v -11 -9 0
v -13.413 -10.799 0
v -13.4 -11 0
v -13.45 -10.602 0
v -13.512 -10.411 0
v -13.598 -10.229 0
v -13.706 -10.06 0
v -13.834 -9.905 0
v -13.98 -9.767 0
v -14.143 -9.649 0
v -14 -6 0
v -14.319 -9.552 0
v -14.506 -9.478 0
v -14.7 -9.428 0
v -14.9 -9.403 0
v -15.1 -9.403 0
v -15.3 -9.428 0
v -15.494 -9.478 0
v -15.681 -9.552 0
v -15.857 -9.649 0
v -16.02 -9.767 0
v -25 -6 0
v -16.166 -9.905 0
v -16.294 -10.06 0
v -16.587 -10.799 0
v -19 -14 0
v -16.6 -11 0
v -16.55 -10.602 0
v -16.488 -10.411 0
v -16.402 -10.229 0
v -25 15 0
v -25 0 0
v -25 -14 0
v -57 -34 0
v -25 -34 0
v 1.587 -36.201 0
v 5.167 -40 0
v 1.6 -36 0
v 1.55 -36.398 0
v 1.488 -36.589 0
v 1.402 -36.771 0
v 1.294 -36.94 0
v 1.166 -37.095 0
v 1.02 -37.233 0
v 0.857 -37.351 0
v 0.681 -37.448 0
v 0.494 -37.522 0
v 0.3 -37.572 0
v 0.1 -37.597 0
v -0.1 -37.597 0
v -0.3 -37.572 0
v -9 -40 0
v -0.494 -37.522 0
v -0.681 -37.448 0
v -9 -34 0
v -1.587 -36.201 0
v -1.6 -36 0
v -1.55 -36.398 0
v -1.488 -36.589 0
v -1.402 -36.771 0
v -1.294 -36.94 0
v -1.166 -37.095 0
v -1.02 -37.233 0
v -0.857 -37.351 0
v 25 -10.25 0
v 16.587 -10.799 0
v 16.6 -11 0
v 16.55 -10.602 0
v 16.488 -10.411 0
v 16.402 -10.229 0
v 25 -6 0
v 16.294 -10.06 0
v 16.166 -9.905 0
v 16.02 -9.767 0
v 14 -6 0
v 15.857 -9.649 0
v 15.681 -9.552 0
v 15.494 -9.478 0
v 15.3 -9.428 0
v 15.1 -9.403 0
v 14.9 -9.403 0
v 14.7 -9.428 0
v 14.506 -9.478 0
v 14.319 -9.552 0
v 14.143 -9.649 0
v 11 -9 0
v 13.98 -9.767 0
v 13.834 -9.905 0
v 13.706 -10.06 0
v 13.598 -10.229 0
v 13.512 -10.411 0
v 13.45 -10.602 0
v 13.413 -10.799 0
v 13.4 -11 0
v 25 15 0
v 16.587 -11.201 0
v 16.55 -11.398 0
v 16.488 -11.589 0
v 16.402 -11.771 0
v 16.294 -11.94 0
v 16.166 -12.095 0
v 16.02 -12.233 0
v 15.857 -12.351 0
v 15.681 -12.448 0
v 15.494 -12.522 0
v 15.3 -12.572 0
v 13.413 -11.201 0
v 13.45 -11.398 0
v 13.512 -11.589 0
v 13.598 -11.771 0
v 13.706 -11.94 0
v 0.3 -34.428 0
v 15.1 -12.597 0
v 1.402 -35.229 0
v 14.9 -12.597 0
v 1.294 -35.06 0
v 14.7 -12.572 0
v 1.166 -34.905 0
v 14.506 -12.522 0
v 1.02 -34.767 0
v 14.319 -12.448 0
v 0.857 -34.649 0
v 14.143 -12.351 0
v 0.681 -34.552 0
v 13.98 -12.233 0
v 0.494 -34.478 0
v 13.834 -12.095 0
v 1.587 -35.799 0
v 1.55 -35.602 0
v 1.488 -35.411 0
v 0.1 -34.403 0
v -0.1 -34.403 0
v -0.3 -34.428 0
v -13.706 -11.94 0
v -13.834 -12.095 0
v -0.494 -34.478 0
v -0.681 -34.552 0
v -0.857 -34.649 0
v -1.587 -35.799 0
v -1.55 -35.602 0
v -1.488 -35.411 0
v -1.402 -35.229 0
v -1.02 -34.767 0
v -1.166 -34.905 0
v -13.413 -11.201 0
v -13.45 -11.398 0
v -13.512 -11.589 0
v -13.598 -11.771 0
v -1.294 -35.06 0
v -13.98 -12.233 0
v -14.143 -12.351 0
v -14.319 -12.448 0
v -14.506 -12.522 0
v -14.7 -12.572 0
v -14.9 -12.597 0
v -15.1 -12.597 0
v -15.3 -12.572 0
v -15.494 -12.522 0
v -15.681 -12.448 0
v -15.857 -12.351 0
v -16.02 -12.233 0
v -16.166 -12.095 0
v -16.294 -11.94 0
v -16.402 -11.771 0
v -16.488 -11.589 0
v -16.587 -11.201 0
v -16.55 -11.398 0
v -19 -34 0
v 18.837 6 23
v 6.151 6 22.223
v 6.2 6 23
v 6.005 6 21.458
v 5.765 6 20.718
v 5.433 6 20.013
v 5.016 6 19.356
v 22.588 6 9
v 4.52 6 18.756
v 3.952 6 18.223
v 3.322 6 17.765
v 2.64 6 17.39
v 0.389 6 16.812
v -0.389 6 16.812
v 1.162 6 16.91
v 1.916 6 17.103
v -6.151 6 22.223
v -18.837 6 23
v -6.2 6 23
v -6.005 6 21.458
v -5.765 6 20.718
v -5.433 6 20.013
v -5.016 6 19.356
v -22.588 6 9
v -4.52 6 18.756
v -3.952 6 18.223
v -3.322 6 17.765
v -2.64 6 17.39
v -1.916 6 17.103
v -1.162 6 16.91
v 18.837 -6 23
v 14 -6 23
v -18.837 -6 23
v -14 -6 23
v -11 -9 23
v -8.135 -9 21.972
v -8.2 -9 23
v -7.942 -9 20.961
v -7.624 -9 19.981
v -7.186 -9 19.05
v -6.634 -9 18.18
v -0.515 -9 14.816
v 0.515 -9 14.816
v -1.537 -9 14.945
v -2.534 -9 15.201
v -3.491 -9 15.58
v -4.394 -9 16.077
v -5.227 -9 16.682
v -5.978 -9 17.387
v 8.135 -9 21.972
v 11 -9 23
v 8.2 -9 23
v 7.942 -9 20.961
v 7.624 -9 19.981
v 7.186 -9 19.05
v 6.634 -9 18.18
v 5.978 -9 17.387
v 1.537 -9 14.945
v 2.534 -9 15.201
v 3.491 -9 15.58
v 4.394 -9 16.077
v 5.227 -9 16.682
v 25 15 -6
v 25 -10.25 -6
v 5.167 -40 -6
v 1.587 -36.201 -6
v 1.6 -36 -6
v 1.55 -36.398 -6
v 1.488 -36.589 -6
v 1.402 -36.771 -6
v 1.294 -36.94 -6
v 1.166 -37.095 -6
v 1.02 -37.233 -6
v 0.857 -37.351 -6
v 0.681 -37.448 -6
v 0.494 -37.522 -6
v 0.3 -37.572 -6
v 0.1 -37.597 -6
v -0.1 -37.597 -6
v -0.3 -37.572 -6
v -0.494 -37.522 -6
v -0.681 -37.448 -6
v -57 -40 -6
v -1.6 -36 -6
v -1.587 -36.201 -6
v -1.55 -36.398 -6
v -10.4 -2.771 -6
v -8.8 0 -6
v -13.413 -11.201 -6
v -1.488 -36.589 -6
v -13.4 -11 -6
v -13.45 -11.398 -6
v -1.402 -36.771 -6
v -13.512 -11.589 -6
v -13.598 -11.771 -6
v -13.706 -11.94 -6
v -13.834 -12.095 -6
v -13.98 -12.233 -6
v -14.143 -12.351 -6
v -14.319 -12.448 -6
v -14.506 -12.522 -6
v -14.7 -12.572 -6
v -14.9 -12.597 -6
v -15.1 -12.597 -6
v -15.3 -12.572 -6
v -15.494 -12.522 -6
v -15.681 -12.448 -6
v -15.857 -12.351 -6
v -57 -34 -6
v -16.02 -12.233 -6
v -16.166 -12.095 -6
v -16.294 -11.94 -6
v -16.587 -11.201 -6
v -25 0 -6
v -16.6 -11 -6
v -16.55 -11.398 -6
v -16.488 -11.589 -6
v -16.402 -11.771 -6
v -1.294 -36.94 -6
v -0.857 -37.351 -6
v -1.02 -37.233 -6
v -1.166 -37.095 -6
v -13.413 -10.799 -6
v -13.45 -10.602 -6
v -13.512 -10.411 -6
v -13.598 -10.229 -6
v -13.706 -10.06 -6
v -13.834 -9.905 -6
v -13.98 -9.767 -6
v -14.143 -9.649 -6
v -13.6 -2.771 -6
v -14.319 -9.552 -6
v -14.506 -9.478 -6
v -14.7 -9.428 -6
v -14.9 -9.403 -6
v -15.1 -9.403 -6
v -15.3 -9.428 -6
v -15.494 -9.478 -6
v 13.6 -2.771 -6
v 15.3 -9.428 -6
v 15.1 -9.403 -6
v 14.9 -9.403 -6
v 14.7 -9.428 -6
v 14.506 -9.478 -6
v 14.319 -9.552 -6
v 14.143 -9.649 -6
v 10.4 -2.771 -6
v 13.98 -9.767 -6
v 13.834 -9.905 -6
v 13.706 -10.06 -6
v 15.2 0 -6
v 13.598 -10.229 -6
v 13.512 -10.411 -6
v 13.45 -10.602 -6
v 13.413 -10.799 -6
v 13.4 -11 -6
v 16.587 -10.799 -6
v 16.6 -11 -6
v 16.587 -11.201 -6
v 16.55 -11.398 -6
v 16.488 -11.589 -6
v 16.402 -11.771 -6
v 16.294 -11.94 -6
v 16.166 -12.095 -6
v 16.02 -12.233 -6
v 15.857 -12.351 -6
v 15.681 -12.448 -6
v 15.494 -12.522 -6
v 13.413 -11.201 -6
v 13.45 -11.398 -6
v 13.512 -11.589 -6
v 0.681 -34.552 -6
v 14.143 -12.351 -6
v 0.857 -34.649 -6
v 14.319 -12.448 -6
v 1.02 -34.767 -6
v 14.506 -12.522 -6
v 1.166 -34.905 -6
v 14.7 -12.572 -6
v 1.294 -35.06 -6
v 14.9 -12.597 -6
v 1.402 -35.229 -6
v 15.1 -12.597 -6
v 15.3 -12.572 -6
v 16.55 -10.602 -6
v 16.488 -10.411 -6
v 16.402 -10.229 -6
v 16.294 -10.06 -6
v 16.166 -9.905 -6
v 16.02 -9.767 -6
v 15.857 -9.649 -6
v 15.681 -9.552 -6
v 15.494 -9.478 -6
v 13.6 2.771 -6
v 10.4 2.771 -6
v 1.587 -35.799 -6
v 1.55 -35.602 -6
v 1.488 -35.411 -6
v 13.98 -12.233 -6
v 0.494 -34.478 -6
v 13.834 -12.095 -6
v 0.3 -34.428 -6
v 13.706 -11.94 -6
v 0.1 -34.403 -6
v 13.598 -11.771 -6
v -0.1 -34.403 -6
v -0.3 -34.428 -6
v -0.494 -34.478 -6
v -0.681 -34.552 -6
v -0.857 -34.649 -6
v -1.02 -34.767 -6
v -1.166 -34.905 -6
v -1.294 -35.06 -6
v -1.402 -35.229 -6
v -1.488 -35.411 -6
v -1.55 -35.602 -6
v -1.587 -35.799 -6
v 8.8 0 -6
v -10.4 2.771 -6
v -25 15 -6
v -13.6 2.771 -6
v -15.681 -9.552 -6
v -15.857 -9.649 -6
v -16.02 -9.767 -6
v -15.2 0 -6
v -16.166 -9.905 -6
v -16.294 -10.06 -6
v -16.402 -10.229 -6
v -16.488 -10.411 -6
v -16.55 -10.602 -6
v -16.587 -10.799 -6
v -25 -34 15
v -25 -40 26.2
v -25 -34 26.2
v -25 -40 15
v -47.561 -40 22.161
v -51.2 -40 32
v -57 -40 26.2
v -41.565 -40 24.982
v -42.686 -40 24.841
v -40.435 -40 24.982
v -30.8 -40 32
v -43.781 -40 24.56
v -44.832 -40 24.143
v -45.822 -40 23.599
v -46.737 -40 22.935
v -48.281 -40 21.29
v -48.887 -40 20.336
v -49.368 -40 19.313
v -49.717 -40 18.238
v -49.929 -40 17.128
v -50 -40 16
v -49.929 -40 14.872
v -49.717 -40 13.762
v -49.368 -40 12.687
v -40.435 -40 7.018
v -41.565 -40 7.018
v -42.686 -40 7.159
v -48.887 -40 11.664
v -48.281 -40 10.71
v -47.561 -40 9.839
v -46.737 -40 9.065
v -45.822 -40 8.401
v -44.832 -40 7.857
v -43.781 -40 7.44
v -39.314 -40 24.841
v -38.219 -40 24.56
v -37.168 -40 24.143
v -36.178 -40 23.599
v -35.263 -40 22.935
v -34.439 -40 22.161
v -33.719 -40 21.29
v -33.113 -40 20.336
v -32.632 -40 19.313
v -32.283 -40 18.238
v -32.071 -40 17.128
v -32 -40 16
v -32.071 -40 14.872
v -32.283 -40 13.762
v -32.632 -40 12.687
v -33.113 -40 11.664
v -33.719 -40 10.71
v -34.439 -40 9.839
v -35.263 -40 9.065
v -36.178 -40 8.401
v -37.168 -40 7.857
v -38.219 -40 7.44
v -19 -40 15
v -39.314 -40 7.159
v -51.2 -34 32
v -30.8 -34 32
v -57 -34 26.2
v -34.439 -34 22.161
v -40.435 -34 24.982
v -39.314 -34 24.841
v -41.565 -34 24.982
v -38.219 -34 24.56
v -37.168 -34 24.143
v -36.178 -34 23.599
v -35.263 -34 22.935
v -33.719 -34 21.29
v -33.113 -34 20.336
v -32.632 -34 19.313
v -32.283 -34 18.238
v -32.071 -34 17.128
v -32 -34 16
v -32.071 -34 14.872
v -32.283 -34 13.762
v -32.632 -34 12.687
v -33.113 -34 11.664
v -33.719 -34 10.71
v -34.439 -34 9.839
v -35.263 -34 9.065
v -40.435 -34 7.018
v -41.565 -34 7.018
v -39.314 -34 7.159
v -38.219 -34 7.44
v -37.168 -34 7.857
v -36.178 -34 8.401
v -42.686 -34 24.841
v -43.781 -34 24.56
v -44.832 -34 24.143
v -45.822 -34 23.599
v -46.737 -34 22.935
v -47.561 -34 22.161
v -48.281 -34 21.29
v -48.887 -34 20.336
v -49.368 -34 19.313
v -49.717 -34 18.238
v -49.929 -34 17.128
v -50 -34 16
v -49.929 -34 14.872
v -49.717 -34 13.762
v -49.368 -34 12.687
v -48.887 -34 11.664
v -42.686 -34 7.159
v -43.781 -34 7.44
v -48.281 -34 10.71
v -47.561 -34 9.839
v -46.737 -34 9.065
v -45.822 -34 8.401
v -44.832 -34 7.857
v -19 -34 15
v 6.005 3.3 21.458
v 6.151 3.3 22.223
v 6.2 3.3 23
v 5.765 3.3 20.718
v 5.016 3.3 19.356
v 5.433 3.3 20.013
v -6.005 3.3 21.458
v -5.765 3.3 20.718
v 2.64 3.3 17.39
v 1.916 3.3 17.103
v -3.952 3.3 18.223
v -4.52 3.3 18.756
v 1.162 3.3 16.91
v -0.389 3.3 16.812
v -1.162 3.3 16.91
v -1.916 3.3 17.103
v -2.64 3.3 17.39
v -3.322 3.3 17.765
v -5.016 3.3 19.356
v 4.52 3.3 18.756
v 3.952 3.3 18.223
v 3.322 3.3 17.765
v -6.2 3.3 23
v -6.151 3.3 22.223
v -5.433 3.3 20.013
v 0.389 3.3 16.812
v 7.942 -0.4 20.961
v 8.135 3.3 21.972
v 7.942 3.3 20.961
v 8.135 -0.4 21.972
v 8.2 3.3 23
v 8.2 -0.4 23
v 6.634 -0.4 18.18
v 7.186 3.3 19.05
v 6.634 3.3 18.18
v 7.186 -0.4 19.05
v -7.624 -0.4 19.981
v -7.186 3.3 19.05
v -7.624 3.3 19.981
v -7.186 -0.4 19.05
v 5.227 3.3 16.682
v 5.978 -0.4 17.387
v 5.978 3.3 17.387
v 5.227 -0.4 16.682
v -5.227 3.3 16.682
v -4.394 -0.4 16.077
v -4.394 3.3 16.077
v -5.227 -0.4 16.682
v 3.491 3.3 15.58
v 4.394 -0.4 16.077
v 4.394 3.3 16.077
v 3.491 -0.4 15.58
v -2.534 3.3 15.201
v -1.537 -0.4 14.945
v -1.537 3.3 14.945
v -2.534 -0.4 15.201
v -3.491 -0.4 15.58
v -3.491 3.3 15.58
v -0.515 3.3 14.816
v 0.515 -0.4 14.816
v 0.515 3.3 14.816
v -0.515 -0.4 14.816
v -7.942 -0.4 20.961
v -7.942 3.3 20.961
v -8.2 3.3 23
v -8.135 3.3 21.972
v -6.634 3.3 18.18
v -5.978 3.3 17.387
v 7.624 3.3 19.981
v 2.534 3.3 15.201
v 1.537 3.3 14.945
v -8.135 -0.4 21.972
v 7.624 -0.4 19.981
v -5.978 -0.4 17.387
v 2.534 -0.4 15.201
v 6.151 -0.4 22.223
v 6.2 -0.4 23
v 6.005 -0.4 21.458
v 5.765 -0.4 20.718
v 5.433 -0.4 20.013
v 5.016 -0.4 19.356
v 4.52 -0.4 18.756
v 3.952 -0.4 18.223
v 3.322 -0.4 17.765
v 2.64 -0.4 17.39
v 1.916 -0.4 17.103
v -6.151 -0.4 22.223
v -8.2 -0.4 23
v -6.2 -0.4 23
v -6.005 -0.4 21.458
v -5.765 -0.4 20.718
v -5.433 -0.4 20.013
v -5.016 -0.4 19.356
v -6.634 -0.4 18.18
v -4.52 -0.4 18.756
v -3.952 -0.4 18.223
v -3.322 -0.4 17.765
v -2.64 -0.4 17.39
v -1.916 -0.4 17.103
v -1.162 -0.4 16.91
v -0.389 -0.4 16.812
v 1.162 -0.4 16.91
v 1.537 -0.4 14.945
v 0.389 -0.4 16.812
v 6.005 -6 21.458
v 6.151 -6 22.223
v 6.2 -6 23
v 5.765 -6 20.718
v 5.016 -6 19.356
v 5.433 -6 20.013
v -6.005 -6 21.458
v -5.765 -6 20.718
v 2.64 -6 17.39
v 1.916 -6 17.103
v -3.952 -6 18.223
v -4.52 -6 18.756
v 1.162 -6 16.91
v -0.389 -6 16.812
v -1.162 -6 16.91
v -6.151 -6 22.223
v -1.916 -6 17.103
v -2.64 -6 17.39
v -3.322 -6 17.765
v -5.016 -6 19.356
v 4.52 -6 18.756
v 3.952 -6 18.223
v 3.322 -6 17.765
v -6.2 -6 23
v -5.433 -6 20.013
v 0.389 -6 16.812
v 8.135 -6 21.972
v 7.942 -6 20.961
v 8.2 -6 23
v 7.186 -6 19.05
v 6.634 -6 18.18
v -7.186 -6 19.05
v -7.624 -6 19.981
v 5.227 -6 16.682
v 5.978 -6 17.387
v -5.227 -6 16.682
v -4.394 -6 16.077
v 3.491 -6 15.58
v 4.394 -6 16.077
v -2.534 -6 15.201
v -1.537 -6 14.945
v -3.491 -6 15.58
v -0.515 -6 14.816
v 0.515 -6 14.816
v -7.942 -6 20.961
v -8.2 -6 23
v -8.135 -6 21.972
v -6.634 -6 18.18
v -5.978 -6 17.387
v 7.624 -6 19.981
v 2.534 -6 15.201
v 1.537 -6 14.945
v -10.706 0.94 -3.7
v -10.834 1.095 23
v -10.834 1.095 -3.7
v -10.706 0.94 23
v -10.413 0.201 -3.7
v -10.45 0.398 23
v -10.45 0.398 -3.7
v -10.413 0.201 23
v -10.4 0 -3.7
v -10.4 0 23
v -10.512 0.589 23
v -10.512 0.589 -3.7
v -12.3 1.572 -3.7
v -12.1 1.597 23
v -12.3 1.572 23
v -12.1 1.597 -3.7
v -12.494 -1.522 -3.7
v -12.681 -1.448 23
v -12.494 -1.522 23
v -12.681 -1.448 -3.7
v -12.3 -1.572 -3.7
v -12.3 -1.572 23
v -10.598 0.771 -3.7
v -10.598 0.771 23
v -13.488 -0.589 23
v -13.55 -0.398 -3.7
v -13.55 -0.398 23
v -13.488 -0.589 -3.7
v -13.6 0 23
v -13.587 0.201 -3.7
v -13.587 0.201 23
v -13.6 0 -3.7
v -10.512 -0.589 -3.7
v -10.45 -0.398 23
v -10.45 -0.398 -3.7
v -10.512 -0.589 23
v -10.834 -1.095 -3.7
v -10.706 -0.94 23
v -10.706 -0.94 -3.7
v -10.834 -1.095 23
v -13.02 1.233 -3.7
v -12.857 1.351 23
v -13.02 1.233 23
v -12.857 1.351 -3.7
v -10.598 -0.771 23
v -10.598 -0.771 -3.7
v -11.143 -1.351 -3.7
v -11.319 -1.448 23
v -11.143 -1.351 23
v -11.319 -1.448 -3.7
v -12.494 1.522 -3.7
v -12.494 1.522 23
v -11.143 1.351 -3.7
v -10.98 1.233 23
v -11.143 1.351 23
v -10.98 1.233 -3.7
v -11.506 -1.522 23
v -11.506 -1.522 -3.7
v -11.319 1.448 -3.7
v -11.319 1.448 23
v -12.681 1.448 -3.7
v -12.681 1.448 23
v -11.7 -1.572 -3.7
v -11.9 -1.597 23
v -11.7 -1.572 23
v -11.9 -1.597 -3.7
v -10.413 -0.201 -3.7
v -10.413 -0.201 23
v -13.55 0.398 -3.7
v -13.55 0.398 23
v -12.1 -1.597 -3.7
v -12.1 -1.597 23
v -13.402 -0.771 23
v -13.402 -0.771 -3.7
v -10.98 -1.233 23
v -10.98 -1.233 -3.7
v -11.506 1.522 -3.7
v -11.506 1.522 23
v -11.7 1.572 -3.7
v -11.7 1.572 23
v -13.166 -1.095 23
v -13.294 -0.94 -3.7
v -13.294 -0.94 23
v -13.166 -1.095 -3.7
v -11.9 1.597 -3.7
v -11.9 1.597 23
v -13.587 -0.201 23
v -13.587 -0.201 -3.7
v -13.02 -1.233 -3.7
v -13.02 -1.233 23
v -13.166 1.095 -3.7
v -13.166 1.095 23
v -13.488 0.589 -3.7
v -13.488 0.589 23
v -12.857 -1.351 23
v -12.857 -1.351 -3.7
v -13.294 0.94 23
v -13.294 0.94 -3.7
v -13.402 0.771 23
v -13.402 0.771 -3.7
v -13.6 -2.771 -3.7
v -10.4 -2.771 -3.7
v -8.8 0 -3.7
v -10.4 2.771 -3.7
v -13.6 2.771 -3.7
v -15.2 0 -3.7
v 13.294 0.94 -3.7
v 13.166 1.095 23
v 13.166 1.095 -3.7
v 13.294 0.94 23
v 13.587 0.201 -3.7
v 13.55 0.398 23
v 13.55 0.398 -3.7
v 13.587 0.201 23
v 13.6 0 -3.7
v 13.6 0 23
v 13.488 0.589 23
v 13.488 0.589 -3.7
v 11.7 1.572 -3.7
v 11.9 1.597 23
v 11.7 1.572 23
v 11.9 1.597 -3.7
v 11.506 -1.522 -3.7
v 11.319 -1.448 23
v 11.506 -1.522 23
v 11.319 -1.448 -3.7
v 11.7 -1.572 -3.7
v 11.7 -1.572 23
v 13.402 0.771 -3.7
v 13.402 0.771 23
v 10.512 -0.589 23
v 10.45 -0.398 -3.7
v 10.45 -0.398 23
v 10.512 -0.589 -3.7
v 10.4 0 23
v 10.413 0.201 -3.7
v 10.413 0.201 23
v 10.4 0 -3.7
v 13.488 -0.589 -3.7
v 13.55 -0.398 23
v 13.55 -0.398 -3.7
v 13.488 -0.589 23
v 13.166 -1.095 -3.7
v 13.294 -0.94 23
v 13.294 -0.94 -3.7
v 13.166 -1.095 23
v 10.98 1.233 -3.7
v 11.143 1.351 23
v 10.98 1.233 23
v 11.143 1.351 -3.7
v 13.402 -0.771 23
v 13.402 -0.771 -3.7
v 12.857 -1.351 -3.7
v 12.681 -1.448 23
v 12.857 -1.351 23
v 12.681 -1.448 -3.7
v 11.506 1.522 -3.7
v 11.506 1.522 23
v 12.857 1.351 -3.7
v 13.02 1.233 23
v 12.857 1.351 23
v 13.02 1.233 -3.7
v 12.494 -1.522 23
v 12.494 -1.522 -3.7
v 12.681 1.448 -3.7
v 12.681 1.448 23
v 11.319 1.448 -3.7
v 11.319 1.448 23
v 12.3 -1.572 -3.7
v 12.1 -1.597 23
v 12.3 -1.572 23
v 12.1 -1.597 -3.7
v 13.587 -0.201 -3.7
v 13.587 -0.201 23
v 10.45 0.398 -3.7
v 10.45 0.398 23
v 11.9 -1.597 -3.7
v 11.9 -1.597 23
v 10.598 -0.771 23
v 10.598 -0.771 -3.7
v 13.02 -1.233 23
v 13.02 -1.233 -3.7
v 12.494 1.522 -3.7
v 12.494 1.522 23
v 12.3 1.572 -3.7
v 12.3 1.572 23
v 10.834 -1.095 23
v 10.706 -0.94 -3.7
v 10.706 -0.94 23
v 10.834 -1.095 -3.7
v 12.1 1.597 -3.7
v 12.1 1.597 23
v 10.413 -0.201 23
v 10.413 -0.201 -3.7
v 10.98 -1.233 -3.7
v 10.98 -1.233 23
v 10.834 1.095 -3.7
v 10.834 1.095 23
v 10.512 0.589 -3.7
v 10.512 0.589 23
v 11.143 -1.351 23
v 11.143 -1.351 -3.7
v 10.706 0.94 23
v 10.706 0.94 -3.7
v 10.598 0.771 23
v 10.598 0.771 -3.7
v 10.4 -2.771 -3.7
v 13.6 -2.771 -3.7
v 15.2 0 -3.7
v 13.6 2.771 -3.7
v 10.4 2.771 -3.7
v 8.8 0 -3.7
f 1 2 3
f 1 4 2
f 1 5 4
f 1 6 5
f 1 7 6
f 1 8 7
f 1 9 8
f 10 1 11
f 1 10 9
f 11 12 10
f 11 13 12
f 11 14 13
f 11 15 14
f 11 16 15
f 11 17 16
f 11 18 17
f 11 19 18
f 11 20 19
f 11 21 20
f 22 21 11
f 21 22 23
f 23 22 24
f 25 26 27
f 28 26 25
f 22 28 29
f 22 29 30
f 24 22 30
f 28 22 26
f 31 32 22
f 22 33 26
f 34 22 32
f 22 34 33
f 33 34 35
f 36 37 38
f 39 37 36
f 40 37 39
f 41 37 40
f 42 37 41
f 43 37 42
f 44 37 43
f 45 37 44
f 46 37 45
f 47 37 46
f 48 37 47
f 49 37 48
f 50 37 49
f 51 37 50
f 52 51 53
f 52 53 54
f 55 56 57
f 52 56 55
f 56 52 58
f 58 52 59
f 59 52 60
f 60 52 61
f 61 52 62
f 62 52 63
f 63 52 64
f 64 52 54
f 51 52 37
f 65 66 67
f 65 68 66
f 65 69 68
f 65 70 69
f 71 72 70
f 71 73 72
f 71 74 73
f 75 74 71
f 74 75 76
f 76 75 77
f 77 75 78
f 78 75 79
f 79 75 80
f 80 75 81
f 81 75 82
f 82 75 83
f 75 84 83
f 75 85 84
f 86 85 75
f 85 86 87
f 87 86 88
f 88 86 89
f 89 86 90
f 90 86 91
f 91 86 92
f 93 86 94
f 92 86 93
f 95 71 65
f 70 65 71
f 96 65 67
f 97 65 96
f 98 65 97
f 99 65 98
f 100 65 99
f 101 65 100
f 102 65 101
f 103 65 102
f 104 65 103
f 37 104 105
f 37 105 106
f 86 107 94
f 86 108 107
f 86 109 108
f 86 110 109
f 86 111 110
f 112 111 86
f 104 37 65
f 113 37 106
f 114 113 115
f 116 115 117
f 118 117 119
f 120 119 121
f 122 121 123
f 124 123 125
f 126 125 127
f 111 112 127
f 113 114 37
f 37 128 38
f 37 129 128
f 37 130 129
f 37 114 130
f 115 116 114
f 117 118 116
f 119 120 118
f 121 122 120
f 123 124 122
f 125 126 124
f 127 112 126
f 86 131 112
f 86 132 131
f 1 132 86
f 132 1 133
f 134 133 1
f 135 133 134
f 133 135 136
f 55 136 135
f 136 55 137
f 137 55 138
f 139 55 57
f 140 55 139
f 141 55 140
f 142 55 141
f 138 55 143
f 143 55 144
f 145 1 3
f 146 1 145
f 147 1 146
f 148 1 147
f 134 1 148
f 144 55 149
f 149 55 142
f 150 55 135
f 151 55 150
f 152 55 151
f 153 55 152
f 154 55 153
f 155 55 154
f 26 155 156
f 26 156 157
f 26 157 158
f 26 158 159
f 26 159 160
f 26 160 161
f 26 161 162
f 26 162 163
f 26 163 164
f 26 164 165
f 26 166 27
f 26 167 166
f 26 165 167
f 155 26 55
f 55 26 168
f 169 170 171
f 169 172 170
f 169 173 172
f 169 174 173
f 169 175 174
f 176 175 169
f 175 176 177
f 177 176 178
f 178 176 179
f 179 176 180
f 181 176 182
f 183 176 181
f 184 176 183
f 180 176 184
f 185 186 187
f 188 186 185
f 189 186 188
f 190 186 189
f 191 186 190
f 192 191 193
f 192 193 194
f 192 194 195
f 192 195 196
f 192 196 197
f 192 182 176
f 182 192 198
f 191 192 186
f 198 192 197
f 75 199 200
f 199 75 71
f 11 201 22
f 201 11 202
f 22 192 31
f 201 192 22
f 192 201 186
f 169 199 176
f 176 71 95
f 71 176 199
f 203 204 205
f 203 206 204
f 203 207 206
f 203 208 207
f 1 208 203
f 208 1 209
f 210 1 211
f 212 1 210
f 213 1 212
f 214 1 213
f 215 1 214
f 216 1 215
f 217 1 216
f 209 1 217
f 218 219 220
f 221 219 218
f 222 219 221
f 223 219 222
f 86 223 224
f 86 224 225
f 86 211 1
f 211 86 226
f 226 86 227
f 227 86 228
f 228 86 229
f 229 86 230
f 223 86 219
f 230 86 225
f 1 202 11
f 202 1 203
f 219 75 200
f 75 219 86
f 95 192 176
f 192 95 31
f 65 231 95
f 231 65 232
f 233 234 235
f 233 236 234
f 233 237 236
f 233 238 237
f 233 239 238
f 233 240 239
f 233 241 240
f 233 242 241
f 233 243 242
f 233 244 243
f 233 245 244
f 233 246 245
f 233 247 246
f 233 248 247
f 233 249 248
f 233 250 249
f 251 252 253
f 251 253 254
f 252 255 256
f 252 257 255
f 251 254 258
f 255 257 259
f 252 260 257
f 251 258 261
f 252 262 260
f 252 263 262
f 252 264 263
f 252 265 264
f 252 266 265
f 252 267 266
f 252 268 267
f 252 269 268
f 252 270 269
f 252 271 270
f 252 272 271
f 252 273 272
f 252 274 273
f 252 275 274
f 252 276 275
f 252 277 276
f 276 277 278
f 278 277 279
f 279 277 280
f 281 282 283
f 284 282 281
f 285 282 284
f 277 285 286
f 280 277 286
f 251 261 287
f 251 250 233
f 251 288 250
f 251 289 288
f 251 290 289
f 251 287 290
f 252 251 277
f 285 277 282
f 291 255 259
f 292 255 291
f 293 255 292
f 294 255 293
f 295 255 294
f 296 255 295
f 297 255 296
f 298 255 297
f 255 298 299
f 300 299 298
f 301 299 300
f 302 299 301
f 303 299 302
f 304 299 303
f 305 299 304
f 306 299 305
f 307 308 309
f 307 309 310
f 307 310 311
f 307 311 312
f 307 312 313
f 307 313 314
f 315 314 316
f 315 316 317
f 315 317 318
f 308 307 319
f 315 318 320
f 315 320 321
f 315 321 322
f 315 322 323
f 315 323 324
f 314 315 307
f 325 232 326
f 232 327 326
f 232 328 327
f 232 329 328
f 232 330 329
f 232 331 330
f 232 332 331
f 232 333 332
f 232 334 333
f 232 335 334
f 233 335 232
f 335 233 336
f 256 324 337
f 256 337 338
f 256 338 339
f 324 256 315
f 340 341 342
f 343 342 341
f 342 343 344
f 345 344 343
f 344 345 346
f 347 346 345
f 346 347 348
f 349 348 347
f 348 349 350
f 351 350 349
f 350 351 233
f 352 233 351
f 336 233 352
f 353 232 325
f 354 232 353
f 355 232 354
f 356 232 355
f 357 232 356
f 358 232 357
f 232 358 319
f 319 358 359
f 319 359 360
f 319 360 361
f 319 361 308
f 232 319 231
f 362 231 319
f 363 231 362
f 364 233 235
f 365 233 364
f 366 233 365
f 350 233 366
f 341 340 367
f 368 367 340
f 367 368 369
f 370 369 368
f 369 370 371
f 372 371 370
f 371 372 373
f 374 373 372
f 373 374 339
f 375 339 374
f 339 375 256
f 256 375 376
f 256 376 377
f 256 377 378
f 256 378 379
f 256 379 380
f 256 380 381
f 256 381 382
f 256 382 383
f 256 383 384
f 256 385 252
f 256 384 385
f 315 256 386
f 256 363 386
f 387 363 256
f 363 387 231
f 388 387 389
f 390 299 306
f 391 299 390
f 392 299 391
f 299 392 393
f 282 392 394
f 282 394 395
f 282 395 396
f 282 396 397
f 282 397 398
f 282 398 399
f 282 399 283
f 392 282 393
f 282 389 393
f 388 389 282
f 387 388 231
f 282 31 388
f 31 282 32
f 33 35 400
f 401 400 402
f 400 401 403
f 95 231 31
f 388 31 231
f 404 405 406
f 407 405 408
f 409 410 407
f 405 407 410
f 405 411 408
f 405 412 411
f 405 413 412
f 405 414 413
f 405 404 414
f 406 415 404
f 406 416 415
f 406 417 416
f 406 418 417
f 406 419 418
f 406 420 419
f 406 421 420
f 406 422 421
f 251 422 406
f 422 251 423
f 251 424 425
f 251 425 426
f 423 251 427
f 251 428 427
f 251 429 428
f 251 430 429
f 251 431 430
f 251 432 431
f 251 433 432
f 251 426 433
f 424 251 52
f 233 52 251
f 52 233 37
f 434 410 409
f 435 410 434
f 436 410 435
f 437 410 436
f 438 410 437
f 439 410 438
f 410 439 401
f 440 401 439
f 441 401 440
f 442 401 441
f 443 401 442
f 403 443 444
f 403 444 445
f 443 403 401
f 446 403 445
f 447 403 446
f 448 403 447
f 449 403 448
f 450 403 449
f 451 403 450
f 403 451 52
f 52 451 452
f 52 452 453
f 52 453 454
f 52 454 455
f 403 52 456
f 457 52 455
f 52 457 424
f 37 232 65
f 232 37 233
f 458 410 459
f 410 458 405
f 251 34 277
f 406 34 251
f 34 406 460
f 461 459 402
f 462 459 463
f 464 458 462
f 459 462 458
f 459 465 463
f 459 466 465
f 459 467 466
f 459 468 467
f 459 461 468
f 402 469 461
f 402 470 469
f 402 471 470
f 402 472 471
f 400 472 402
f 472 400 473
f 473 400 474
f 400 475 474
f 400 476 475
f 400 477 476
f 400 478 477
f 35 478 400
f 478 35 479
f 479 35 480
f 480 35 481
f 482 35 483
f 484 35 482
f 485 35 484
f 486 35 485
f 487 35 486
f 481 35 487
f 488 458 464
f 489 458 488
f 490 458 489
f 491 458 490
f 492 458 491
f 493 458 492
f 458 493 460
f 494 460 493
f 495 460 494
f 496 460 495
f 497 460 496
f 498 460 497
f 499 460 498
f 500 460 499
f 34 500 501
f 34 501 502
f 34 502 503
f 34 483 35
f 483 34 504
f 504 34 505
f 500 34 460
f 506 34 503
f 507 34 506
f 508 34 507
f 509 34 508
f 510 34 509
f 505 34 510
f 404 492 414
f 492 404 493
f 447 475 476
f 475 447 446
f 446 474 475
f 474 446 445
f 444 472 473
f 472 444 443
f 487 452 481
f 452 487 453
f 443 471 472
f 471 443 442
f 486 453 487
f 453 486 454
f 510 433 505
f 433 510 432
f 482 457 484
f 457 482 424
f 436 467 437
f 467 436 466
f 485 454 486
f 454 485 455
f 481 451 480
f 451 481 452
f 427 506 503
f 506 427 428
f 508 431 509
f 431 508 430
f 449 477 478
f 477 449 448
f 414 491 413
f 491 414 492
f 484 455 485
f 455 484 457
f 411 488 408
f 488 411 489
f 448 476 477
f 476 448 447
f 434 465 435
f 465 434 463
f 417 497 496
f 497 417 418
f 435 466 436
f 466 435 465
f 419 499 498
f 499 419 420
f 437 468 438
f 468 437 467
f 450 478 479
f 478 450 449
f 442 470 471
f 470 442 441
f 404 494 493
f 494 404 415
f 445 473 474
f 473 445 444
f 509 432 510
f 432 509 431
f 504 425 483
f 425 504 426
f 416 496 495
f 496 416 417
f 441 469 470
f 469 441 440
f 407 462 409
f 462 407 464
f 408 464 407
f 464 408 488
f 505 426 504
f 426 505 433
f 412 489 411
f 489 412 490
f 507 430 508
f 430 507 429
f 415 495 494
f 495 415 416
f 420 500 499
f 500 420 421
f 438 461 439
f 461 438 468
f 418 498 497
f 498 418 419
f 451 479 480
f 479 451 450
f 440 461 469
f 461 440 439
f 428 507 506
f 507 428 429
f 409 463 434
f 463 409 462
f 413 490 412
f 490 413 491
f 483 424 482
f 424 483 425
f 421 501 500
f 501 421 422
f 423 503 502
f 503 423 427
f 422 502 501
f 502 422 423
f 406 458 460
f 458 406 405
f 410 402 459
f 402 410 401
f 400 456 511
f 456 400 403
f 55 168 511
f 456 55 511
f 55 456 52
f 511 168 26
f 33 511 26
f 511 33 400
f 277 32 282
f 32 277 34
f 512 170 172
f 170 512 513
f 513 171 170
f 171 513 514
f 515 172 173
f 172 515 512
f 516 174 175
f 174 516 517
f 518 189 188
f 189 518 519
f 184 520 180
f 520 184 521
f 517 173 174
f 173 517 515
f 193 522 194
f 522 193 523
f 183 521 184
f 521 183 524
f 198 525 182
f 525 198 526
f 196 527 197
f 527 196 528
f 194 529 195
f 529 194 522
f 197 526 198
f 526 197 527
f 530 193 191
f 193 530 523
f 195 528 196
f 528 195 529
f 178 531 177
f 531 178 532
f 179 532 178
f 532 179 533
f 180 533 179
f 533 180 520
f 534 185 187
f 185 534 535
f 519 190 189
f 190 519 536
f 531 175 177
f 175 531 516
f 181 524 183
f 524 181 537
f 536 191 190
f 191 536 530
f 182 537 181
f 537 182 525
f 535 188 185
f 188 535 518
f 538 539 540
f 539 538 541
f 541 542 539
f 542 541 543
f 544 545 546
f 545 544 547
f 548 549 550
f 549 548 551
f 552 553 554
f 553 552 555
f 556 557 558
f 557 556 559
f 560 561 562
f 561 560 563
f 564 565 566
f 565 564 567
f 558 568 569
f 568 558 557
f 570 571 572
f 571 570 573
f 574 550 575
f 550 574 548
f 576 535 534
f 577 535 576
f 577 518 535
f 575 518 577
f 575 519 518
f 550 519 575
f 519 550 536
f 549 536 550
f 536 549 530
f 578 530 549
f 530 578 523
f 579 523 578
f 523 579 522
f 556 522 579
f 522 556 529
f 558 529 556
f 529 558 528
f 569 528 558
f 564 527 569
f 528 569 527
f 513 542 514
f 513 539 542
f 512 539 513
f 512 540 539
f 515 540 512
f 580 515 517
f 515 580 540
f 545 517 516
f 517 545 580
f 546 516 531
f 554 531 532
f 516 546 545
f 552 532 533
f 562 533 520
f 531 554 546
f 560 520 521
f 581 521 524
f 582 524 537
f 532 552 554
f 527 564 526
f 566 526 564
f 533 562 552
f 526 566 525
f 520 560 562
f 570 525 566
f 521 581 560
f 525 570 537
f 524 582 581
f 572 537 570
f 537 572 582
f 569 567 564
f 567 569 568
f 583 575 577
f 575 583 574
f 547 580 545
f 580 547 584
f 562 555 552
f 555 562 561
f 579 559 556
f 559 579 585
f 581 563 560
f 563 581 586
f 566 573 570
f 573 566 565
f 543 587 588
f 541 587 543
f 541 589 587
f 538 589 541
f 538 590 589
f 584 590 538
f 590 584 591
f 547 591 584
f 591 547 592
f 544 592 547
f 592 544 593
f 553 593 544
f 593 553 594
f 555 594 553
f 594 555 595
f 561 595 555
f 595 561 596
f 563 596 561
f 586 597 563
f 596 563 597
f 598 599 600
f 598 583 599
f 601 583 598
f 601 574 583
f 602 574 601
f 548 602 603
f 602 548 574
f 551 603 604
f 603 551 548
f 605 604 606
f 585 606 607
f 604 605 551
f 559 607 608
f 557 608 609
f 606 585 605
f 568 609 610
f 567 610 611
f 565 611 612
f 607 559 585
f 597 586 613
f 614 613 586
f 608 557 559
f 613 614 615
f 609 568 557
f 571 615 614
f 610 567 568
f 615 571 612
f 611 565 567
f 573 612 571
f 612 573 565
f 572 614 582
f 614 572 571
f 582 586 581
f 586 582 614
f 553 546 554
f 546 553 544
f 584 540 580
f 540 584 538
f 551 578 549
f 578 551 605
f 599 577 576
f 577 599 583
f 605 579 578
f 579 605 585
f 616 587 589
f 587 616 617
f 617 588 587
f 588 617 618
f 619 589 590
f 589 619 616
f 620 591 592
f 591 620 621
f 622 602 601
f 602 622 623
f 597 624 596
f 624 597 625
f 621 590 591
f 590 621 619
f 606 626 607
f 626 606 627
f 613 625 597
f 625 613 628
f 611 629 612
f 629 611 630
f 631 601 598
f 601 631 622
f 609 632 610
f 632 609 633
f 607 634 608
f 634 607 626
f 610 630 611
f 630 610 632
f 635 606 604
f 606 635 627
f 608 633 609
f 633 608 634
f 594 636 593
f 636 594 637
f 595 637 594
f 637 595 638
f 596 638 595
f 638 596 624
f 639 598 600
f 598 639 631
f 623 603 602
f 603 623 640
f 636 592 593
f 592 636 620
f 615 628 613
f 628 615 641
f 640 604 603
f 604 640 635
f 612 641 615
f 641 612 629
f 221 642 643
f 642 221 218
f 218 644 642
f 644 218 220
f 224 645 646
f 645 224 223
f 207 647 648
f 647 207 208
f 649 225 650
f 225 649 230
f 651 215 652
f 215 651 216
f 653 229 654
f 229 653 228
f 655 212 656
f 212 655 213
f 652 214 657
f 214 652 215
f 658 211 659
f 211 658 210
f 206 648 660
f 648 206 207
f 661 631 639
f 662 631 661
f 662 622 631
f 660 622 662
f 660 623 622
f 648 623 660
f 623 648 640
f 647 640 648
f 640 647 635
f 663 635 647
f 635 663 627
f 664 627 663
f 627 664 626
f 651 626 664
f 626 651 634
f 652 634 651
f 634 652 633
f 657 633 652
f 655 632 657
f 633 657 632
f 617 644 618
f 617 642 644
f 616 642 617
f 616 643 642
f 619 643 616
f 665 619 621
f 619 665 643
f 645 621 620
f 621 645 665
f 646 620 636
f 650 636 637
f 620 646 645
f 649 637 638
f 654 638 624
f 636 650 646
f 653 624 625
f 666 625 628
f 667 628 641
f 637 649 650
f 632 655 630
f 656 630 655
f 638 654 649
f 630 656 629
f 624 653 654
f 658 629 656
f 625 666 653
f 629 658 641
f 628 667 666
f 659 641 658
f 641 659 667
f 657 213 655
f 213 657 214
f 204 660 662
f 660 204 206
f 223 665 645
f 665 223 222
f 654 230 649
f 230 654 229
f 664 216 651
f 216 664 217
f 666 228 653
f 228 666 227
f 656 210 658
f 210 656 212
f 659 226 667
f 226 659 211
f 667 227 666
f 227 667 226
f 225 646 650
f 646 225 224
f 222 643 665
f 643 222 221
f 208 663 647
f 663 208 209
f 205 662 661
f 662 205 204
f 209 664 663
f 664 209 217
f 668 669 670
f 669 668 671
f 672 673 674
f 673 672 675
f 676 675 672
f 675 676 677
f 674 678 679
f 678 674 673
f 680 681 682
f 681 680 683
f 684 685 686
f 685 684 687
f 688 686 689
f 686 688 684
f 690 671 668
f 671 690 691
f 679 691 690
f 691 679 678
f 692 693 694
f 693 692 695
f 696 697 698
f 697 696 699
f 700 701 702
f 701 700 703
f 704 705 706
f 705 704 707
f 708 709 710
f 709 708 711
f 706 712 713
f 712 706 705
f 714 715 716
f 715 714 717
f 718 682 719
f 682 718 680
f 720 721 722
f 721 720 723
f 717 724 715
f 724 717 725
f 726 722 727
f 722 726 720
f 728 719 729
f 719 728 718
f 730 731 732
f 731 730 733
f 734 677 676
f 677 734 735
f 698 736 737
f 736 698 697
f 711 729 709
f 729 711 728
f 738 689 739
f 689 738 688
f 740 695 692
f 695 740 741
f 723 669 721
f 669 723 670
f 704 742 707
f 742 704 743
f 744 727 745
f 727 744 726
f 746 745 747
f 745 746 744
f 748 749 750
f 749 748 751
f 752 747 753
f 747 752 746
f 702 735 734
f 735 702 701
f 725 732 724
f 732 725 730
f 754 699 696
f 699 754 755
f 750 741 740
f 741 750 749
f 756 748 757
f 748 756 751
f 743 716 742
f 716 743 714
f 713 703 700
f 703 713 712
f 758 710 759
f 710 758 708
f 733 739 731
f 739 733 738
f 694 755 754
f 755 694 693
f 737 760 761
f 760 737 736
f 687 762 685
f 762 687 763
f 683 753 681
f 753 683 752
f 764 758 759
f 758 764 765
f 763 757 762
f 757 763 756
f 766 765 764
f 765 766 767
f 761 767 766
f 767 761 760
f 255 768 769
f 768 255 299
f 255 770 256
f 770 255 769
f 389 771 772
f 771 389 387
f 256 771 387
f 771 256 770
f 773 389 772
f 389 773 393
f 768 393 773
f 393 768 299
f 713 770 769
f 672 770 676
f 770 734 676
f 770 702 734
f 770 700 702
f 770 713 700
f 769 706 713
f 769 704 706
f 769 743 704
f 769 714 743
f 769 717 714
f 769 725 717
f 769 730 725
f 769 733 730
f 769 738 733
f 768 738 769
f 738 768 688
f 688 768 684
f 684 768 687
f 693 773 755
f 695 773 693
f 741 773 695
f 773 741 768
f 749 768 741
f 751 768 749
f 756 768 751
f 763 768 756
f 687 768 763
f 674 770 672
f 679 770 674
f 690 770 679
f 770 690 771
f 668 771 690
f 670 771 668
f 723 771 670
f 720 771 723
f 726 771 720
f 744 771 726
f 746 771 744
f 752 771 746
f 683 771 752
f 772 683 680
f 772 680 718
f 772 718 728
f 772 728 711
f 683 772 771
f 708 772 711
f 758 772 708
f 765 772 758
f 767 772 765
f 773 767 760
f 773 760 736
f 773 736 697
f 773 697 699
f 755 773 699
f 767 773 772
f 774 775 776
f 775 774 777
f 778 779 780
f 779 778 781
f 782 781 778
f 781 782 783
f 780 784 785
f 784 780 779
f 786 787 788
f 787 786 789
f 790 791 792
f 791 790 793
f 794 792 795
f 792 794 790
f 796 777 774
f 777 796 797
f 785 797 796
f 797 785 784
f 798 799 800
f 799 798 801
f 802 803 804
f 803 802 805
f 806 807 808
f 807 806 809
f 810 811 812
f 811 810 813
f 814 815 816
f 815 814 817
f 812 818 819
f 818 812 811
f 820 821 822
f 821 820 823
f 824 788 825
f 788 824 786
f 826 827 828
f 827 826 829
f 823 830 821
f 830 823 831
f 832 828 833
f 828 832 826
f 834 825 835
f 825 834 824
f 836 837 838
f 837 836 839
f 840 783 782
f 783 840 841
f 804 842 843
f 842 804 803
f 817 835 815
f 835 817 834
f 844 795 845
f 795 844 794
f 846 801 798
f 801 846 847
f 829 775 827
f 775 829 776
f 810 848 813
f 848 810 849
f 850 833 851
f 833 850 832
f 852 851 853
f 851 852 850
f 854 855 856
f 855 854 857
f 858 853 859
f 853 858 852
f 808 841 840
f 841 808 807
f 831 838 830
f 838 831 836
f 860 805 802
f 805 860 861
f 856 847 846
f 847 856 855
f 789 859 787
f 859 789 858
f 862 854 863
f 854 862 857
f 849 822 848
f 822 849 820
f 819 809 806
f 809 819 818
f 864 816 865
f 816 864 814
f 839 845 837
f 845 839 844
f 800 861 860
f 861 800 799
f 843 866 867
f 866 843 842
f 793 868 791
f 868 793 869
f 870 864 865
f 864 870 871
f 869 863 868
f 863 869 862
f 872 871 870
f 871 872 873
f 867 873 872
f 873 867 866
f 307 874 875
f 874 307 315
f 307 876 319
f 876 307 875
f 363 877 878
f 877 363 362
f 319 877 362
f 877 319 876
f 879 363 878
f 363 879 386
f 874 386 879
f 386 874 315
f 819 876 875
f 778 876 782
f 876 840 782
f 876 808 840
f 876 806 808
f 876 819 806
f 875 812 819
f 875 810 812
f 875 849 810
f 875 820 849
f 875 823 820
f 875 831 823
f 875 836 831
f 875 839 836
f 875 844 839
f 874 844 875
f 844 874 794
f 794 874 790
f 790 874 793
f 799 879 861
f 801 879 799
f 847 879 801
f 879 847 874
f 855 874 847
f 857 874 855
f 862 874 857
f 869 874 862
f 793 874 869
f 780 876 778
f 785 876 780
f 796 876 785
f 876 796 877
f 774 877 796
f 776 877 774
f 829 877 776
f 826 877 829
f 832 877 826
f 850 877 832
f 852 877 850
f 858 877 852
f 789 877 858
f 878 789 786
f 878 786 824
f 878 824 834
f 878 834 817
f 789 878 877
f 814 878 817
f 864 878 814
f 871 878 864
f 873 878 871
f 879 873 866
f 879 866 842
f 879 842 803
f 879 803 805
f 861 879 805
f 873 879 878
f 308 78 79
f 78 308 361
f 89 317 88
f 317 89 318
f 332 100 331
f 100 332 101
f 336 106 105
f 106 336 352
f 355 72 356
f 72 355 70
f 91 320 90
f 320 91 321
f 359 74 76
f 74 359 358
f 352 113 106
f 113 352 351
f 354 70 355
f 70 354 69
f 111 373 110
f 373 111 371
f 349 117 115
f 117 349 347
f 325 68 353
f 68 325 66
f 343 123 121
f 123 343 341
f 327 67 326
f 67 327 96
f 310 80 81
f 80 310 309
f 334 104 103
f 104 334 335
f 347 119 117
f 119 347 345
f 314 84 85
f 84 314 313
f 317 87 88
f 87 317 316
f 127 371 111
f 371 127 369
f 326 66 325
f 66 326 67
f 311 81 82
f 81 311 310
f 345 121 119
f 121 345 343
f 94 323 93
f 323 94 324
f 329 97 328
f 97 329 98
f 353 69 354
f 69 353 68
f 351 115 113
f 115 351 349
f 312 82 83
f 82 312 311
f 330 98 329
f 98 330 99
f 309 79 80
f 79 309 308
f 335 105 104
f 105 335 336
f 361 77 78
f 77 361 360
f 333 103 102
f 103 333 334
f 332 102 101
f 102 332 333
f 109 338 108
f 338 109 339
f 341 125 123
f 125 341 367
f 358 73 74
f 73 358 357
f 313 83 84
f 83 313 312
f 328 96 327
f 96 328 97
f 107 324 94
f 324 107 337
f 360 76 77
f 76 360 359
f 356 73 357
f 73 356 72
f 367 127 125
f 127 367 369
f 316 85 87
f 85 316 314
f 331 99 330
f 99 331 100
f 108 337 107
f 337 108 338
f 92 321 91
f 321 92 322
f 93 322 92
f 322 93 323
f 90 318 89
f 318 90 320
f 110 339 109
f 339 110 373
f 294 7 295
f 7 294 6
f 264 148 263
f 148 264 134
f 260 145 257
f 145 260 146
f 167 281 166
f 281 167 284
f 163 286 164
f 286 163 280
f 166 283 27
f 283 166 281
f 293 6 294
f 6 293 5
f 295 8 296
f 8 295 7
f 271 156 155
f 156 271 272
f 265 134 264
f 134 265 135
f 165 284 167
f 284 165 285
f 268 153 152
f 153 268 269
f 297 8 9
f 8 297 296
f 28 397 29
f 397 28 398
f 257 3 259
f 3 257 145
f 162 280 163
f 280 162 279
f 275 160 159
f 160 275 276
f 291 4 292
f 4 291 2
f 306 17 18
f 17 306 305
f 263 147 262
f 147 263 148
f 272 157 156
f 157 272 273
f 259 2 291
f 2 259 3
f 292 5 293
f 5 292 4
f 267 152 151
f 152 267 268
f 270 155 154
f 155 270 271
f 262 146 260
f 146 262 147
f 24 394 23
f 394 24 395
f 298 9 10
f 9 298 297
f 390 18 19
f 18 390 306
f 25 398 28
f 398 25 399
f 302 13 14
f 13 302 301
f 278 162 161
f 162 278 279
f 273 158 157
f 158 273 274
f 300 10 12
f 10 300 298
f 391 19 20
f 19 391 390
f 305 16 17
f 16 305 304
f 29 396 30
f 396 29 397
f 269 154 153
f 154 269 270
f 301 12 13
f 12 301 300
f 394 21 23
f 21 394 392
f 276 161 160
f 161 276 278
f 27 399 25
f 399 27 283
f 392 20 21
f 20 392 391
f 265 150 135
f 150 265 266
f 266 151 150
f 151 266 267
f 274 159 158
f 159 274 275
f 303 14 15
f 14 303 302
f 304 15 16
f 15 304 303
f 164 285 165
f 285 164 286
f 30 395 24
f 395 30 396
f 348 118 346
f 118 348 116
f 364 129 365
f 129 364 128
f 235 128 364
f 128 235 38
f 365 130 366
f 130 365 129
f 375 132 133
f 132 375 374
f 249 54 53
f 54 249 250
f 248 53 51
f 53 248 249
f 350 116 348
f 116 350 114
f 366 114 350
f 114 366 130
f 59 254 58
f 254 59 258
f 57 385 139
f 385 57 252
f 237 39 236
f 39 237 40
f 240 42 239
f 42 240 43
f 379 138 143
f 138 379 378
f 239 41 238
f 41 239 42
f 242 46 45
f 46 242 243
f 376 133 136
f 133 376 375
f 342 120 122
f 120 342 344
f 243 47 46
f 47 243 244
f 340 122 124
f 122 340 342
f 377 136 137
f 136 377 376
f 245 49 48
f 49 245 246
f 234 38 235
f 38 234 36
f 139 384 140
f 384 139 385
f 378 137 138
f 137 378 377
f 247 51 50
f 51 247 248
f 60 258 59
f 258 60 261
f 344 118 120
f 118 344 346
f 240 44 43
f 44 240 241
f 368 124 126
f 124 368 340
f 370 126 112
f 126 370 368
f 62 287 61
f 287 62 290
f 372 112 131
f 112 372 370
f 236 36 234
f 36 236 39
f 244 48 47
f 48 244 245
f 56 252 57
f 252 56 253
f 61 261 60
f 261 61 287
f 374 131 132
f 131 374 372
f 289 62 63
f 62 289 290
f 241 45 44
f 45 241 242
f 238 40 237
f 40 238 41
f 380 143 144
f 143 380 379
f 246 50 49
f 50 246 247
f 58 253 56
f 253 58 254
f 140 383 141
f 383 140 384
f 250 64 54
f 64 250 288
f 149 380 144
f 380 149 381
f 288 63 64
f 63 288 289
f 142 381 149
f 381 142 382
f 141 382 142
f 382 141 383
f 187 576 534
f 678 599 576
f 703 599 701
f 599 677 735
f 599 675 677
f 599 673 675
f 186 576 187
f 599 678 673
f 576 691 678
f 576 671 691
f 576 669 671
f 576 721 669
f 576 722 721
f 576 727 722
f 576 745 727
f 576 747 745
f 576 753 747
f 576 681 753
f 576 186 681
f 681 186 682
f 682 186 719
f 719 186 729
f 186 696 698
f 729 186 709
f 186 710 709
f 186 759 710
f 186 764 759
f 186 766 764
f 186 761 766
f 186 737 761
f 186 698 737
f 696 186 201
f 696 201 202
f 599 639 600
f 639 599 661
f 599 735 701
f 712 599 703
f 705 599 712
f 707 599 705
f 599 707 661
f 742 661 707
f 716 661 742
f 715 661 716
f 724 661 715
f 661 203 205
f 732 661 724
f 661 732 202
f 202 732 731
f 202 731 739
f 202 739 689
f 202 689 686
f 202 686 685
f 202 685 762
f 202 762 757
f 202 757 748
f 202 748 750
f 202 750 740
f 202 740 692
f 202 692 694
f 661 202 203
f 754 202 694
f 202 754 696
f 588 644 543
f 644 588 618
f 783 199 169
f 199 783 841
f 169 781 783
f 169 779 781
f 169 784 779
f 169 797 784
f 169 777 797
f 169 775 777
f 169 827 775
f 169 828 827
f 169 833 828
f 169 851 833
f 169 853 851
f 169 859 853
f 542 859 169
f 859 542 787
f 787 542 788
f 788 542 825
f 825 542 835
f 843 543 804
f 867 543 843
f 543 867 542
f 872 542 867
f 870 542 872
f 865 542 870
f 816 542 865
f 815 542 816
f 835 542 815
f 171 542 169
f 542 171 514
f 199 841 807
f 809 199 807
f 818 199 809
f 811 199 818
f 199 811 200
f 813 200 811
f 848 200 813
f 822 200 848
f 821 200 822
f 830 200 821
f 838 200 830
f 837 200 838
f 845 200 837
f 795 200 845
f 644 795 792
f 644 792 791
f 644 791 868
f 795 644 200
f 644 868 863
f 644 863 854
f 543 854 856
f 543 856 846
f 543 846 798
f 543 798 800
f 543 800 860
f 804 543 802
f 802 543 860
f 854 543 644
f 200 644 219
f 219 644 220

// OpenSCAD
//head
include <MCAD/nuts_and_bolts.scad>;
$fn=50;
mode=1; //0-full 1-base part 2-clamp
extruder=0;  // 0 - model 1-additivities
oversize=0.2;
hole_height=18+5;
detector_diameter=18;
detector_washer=1+31;
detector_edge=15;
plate_width=50;
echo ("Y_PROBE_OFFSET_FROM_EXTRUDER =",(hole_height-detector_washer/2));
echo ("X_PROBE_OFFSET_FROM_EXTRUDER =",-(plate_width/2+detector_washer/2));
//subs
module prism(l, w, h) {
	translate([0, l, 0]) rotate( a= [90, 0, 0]) 
	linear_extrude(height = l) polygon(points = [
		[0, 0],
		[w, 0],
		[0, h]
	], paths=[[0,1,2,0]]);
}
module trapeze(w1,w2,d,h){
    down=min(w1,w2);
    low=abs(w1-w2)/2;
    translate([down/-2,d/-2,0]){
        cube([down,d,h]);
        prism(d,-low,h);
    }
    translate([down/2,d/-2,0])prism(d,low,h);
}

//hotend
module head_hole(cap=6){
  inner=5.6; //v5
  //inner=6;   //v6
  top=3.7;
  bottom=3;
    translate([0,0,bottom+inner+top-0.1])cylinder(5,r=cap+oversize);
    translate([0,0,bottom+inner])cylinder(top,r=8+oversize);
    translate([0,0,bottom-0.1])cylinder(inner+0.2,r=6+oversize);
    translate([0,0,-0.1])cylinder(bottom+0.1,r=8+oversize);
}
module detector_clamp(){
    translate([0,0,6])cube([6,6,detector_edge]);
    translate([6,0,6])prism(6,10,detector_edge);
    translate([6,6,6])rotate([0,0,90,0])prism(6,20,detector_edge);
    translate([0,6,0])rotate([90,0,180])prism(6,detector_washer,40-6);
    translate([-detector_washer,0,0])difference(){
        cube([detector_washer,6,6+detector_washer]);
        translate([detector_washer/2,-0.1,detector_washer/2+6])rotate([-90,0,0])cylinder(6.2,d=detector_diameter);
        translate([-0.1,-0.1,detector_washer+6+0.1])rotate([0,90,0])prism(6.2,6,6);
        translate([detector_washer+0.1,-0.1,detector_washer+6+0.1])rotate([0,180,0])prism(6.2,6,6);
    }
}
module full (){
    h=28+7;
    w=plate_width;
    base=11;
    plate=55;
difference(){
    union(){
        trapeze(w,w-2*h*tan(15),12,h);
        translate([0,12/-2,h/2])rotate([90,0,0])trapeze(22+3*2,22,h,3);
        translate([0,6,0])
            intersection(){
                rotate([0,0,90])translate([0,-w/2,0])prism(w,9,9);
                translate([0,9/2,0])trapeze(w,w-2*h*tan(15),9,h);
            }
        //plate
        translate([-w/2,-plate+9+6,-6])
         {
          difference(){
            cube([w,plate,6]);
            translate([w+0.1,-0.1,-0.1])rotate([90,0,180])prism(6.2,20,30);
          }
          detector_clamp();
        }
    }
    translate([0,-9,hole_height])rotate([-90,0,0])head_hole(6);
    
    for (s=[-12,12]){
        translate([s,0,-6-0.1]){ cylinder(h+6,r=1.6); nutHole(3); }
        translate([s,0,h-3])cylinder(3.1,r=3);
    }
    //base holes
    translate([0,-base,0])
    {
        translate([15,0,-6-0.1])cylinder(6.2,r=1.6);
        translate([-15,0,-6-0.1])cylinder(6.2,r=1.6);
        translate([0,-25,-6-0.1])cylinder(6.2,r=1.6);
    }
    //translate([0,-21,-6-0.1])cylinder(6.2,r=9);    
}
}

if (mode==0)
    full();
else
if (mode==1)
difference(){
    full();
    translate([-30,-10,hole_height])cube([60,20,hole_height]);
}
else
if (mode==2){ rotate([0,180,0])translate([0,0,-hole_height])intersection(){
    full();
    translate([-30,-10,hole_height])cube([60,20,hole_height]);
}
}
if (extruder==1)
	translate([0,0,hole_height]){
	translate([-0,-60,0])
	rotate([0,-90,0])
	translate([-8.7,0,-15.85])import("E3D V6 1.75 Uni model.STL", convexity=3);

	translate([0,-25,0])
	rotate([90,-90,0])
	translate([15.9,-2.5,-25])scale(0.85)import("E3D_Duct_wo_Plate.stl", convexity=3);

	translate([5,-29.5,13])rotate([90,-90,0])
	mirror()rotate([0,32.5,0])
	translate([2,3,-35-15])import("E3D_Fan_Nozzle_v2.stl", convexity=3);
}
